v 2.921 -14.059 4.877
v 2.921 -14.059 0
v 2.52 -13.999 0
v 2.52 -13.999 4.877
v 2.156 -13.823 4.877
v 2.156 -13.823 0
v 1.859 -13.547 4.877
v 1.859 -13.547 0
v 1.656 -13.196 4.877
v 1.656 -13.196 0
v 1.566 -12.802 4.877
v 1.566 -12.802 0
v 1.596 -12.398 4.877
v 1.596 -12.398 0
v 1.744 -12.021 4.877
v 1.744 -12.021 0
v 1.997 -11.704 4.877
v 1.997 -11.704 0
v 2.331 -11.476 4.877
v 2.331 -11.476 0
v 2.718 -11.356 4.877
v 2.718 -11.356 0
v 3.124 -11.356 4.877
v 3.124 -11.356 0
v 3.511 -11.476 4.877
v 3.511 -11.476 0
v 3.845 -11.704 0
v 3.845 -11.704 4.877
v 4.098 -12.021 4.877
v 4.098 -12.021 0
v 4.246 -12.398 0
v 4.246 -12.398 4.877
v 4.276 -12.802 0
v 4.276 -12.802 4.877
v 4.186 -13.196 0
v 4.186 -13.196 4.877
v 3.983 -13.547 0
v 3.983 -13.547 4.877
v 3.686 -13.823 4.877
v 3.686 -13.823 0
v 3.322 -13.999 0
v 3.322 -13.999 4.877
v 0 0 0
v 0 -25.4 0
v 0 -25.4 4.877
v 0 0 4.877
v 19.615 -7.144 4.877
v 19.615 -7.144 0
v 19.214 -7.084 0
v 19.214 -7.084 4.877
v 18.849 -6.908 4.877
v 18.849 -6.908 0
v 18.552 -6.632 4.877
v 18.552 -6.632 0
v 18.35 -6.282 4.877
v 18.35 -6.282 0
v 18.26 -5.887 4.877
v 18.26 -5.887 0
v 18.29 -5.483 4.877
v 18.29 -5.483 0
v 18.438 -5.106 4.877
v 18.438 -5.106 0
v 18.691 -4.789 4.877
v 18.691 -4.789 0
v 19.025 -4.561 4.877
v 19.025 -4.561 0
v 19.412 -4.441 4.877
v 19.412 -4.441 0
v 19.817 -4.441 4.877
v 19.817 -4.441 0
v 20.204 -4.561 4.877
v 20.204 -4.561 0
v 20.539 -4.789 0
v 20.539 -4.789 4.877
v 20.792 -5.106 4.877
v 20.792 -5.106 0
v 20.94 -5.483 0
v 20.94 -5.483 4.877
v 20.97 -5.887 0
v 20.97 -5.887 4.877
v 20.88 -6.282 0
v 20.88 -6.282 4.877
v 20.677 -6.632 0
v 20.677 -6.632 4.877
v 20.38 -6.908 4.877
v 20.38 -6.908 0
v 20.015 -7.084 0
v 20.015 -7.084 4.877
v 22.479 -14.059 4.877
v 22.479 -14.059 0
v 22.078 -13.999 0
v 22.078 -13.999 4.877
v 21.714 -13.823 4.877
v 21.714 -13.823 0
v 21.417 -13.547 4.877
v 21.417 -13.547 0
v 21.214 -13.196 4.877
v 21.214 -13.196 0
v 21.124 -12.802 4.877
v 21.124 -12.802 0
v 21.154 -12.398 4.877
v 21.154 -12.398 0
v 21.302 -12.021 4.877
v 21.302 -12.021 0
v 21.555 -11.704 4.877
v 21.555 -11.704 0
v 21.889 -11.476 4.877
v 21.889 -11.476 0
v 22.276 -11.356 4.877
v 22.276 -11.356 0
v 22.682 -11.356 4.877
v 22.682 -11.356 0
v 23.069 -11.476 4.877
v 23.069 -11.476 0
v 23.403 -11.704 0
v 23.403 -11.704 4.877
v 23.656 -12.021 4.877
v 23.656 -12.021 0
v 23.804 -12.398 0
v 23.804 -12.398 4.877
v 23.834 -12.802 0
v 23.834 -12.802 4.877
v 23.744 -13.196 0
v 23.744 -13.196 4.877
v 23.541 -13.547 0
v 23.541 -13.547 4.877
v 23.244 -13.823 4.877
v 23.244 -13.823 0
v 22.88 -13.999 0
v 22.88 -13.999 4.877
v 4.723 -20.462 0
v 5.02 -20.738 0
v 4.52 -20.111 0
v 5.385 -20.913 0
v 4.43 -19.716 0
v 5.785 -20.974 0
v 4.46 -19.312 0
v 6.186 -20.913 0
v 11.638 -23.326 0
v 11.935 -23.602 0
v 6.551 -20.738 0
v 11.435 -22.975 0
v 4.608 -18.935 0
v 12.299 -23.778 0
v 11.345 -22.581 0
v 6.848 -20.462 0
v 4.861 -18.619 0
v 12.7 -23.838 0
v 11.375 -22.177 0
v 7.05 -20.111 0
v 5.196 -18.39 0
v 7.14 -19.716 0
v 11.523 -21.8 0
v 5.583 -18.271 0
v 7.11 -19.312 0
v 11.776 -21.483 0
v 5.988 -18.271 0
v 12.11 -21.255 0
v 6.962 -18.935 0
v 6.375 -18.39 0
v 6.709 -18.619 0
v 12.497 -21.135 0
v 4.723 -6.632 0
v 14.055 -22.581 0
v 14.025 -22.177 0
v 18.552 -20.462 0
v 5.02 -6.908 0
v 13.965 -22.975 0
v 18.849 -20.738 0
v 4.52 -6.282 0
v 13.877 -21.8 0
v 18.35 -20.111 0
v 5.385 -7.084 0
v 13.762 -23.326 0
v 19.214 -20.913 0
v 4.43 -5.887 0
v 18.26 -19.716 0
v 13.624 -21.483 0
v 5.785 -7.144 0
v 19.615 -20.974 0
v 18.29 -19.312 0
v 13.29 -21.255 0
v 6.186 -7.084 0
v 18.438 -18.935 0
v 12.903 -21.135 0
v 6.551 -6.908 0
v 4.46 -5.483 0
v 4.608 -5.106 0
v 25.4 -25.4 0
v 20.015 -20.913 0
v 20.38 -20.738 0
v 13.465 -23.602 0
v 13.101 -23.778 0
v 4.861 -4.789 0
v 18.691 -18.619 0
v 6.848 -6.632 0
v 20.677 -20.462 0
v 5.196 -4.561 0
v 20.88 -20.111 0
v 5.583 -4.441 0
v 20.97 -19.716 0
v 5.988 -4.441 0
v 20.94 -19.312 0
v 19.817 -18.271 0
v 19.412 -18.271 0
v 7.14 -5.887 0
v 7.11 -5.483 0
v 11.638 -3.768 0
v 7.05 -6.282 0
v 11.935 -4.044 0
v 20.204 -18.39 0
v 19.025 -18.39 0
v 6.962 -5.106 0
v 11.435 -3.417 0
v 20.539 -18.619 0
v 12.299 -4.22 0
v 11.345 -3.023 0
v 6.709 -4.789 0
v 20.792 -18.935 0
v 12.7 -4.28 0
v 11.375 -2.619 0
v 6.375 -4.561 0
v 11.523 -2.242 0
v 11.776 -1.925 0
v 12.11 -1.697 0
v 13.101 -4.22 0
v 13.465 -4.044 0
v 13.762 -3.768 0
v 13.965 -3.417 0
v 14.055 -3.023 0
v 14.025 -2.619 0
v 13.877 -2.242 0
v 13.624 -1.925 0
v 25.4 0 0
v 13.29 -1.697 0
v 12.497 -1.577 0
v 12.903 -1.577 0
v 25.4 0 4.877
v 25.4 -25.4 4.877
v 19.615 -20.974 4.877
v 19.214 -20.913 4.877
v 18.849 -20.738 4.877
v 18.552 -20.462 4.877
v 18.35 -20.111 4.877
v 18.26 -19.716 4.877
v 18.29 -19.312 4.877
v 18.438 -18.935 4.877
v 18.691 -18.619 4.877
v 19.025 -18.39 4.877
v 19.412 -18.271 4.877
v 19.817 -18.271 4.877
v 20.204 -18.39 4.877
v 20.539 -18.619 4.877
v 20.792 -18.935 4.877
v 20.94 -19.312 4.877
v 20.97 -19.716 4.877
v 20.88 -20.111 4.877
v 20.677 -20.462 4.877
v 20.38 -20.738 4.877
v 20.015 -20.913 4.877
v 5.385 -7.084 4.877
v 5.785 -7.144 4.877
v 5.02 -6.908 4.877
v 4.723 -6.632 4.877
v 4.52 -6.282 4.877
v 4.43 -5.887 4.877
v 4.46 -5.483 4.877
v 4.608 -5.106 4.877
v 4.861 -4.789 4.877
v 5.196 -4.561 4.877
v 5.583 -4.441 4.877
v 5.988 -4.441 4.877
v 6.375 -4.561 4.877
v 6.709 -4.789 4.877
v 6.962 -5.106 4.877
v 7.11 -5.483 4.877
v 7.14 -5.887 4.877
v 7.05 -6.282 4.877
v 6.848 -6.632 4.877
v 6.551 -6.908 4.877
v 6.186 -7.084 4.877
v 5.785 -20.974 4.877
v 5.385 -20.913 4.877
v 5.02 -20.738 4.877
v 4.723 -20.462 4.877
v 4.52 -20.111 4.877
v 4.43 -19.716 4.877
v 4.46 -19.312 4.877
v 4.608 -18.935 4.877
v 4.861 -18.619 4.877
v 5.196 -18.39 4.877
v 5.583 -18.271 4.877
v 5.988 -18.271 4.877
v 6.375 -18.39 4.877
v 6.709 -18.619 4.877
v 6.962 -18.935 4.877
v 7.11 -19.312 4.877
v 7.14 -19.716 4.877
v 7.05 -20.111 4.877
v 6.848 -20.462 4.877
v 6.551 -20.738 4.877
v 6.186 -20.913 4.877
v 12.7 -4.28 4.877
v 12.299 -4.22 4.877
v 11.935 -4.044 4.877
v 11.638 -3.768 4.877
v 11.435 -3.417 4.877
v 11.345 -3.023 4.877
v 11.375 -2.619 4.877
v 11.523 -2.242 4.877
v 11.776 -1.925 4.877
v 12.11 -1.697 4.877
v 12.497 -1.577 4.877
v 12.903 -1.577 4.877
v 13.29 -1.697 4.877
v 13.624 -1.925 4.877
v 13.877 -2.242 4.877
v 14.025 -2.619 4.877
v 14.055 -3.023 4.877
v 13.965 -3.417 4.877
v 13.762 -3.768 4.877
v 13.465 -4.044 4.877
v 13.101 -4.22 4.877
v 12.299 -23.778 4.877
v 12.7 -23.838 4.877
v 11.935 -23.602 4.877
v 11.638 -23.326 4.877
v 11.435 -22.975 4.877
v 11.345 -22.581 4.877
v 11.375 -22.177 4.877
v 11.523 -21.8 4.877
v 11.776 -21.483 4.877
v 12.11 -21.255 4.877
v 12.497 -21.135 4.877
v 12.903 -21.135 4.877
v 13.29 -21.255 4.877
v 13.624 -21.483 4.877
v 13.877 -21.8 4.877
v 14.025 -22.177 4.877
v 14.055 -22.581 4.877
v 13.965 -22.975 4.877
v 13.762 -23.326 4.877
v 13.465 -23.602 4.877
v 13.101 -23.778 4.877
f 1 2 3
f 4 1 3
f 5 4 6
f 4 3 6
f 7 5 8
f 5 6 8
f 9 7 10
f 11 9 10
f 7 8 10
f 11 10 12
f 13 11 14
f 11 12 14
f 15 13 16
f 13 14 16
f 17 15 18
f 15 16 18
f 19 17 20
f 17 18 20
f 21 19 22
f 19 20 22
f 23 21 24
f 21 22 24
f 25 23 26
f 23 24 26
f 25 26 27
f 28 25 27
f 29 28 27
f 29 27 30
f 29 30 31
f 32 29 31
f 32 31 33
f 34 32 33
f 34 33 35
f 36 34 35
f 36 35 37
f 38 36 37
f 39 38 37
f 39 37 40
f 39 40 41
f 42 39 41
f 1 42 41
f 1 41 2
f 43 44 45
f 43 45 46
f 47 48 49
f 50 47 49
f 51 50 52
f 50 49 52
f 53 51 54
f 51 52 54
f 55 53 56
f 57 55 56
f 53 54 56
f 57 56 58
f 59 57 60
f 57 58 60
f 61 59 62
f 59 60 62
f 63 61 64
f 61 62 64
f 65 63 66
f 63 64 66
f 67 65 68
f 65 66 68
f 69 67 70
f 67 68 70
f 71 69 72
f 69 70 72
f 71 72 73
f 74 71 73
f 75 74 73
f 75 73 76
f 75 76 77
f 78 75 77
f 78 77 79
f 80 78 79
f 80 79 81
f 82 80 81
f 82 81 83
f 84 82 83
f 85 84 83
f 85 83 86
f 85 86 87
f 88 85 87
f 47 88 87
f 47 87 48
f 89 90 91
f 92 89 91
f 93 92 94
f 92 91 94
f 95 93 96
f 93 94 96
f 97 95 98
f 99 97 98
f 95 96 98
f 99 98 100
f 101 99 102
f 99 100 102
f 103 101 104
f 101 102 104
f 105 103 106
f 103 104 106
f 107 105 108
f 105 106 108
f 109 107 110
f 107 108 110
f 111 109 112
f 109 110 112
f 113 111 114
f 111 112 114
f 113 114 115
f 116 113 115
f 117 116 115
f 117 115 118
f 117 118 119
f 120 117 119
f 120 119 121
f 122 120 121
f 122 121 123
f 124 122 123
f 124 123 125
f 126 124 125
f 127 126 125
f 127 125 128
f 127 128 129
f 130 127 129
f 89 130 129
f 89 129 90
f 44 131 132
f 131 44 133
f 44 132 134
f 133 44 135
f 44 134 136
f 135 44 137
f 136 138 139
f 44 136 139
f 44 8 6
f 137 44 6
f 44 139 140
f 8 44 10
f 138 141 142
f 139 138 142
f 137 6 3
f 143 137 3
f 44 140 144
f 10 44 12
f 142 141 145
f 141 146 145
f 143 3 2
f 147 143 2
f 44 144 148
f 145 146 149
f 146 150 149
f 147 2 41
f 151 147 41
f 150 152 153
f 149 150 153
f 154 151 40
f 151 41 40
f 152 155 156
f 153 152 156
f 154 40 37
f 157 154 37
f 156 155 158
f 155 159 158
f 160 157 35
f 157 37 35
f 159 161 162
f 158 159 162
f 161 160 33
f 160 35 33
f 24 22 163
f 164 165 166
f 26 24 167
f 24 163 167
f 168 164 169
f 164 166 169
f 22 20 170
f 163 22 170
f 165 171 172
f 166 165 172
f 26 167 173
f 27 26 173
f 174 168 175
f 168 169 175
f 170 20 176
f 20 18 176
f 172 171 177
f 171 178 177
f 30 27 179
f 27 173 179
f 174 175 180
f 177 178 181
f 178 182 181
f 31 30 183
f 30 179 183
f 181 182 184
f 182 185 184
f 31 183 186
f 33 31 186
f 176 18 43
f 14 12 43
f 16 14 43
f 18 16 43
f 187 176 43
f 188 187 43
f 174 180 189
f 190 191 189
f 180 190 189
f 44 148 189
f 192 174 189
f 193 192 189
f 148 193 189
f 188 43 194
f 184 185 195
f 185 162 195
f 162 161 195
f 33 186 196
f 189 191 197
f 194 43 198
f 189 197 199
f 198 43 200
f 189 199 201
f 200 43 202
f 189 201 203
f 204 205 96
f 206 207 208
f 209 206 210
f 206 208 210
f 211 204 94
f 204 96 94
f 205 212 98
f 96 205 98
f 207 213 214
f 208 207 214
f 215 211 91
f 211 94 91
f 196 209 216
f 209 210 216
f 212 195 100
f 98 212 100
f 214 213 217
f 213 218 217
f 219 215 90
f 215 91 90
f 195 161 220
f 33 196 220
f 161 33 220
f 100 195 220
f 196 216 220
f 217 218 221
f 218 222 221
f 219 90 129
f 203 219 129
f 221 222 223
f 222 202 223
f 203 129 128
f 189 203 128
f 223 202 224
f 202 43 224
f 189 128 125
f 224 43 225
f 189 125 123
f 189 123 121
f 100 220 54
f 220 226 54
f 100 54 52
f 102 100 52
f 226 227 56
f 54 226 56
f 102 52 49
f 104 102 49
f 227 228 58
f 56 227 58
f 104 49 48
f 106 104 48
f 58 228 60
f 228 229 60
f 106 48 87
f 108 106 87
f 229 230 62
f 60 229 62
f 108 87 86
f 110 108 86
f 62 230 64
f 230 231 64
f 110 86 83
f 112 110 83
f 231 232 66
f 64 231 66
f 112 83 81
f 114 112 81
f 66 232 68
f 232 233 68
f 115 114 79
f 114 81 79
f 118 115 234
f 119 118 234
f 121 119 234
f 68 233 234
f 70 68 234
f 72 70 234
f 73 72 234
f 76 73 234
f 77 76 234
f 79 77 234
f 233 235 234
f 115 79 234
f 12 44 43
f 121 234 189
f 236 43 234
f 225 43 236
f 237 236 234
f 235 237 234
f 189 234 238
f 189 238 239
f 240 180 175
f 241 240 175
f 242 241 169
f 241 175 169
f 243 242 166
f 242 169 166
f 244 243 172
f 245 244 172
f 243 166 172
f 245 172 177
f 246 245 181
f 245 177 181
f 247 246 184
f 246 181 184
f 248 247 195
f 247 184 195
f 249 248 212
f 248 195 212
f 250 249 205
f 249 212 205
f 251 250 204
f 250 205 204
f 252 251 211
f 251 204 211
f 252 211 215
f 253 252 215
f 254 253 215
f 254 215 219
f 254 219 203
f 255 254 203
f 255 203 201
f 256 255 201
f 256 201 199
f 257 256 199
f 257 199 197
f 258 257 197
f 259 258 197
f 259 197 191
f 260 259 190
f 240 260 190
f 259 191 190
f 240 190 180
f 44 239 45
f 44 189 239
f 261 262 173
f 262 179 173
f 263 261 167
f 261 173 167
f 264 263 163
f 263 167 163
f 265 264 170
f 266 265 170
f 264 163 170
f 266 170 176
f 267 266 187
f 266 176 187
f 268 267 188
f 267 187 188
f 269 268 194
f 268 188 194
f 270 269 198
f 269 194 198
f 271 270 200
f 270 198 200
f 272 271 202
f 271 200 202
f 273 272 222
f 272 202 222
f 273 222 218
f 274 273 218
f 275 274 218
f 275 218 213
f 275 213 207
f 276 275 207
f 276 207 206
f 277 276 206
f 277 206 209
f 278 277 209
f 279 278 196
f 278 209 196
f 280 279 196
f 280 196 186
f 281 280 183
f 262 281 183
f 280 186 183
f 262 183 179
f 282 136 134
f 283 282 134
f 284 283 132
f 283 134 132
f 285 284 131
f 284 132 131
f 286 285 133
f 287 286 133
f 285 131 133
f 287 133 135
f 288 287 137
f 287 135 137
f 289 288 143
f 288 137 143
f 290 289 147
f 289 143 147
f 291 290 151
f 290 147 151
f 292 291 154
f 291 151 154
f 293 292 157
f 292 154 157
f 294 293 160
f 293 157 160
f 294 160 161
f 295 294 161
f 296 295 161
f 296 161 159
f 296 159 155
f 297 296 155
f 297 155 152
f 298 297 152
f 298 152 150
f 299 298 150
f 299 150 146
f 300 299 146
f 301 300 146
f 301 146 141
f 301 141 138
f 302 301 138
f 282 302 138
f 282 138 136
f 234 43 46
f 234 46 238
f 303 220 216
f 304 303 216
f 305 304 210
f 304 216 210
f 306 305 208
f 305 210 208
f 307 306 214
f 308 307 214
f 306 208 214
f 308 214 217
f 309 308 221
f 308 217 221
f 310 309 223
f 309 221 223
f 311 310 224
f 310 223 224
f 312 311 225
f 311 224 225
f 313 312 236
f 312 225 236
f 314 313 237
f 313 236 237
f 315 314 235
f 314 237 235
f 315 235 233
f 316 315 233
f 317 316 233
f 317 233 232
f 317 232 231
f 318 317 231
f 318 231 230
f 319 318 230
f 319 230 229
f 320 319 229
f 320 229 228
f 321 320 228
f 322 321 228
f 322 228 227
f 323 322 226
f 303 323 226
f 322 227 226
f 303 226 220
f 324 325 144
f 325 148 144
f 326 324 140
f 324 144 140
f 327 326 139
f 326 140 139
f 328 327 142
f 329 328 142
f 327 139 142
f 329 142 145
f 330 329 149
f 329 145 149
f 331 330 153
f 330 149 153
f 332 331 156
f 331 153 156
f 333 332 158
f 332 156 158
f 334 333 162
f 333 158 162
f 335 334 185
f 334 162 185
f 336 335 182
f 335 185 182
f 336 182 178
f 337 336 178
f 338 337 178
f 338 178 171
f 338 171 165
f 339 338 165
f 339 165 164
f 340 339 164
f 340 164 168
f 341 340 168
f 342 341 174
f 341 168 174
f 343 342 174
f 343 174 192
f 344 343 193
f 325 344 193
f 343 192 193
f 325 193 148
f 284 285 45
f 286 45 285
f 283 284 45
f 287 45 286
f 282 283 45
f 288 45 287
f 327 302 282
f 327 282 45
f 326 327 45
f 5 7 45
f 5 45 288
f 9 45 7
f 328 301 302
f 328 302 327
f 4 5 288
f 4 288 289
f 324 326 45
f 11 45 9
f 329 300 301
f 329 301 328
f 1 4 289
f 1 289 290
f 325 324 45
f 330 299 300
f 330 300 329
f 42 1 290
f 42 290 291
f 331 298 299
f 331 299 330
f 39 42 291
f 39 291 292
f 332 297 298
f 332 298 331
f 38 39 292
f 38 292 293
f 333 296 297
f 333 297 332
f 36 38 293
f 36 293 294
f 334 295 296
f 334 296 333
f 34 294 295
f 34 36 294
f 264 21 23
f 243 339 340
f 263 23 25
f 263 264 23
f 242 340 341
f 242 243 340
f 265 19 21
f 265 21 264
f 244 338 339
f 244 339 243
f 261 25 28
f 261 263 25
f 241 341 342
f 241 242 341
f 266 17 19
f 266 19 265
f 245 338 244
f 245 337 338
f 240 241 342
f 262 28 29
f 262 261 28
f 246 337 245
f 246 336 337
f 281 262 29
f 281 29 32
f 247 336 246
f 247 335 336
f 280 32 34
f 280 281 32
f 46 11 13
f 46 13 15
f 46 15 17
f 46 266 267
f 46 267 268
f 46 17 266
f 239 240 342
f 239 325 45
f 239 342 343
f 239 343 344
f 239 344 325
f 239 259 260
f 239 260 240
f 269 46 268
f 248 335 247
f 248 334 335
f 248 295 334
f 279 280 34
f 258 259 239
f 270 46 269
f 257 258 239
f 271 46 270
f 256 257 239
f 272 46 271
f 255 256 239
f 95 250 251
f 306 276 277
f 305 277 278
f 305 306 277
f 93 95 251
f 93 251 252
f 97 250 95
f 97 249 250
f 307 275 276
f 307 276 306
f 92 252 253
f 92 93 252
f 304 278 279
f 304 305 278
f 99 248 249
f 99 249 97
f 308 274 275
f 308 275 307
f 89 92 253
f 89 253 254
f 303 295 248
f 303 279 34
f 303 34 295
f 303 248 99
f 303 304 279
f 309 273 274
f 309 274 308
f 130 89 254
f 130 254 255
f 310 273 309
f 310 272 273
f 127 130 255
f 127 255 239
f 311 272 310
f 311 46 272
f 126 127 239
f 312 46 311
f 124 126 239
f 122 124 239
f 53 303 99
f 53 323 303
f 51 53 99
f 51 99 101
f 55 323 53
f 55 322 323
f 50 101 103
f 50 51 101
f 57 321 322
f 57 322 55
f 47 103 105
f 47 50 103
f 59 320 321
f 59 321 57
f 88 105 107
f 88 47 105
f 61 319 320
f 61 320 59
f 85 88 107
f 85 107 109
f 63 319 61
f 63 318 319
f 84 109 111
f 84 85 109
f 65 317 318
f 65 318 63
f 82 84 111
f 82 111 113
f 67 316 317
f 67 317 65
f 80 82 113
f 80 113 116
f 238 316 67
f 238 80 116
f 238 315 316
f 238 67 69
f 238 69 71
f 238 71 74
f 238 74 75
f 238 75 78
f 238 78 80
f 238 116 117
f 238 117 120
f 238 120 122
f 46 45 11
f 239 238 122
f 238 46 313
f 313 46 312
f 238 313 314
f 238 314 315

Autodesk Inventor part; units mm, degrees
ref_plane "YZ Plane" through (0, 0, 0) normal (1, 0, 0) x (0, 1, 0)
ref_plane "XZ Plane" through (0, 0, 0) normal (0, 1, 0) x (-1, 0, 0)
ref_plane "XY Plane" through (0, 0, 0) normal (0, 0, 1) x (1, 0, 0)
sketch "Sketch1" plane through (0, 0, 0) normal (0, 0, 1) x (1, 0, 0)
  line L0 (0, 0) -> (25.4, 0)
  line L1 (25.4, 0) -> (25.4, -25.4)
  line L2 (25.4, -25.4) -> (0, -25.4)
  line L3 (0, -25.4) -> (0, 0)
  dimension "d0" = 25.4
  dimension "d1" = 25.4
extrude "Extrusion1" add sketch "Sketch1" along normal blind 4.8768
sketch "Sketch2" plane through (0, 0, 4.8768) normal (0, 0, 1) x (1, 0, 0)
  line L0 (0, 0) -> (0, -25.4) projected
  line L1 (0, -12.7) -> (12.7, -12.7)
  line L2 (12.7, -12.7) -> (12.7, -2.921)
  point P0 (5.7852, -5.7852)
  point P1 (2.921, -12.7)
  point P2 (5.7852, -19.6148)
  point P3 (12.7, -22.479)
  point P4 (19.6148, -19.6148)
  point P5 (22.479, -12.7)
  point P6 (19.6148, -5.7852)
  dimension "d4" = 12.7
  dimension "d5" = 9.779
  dimension "d15" = 360
hole "Hole1" at (12.7, -2.921, 4.8768) at (19.6148, -5.7852, 4.8768) at (22.479, -12.7, 4.8768) at (19.6148, -19.6148, 4.8768) at (12.7, -22.479, 4.8768) at (5.7852, -19.6148, 4.8768) at (2.921, -12.7, 4.8768) at (5.7852, -5.7852, 4.8768) direction (0, 0, -1) diameter 2.7178 depth 25.4 tip angle 118
sketch "Sketch3" plane through (0, 0, 4.8768) normal (0, 0, 1) x (1, 0, 0)
  point P0 (0, 0)
properties part number "GlyphtPlateAttachment"
